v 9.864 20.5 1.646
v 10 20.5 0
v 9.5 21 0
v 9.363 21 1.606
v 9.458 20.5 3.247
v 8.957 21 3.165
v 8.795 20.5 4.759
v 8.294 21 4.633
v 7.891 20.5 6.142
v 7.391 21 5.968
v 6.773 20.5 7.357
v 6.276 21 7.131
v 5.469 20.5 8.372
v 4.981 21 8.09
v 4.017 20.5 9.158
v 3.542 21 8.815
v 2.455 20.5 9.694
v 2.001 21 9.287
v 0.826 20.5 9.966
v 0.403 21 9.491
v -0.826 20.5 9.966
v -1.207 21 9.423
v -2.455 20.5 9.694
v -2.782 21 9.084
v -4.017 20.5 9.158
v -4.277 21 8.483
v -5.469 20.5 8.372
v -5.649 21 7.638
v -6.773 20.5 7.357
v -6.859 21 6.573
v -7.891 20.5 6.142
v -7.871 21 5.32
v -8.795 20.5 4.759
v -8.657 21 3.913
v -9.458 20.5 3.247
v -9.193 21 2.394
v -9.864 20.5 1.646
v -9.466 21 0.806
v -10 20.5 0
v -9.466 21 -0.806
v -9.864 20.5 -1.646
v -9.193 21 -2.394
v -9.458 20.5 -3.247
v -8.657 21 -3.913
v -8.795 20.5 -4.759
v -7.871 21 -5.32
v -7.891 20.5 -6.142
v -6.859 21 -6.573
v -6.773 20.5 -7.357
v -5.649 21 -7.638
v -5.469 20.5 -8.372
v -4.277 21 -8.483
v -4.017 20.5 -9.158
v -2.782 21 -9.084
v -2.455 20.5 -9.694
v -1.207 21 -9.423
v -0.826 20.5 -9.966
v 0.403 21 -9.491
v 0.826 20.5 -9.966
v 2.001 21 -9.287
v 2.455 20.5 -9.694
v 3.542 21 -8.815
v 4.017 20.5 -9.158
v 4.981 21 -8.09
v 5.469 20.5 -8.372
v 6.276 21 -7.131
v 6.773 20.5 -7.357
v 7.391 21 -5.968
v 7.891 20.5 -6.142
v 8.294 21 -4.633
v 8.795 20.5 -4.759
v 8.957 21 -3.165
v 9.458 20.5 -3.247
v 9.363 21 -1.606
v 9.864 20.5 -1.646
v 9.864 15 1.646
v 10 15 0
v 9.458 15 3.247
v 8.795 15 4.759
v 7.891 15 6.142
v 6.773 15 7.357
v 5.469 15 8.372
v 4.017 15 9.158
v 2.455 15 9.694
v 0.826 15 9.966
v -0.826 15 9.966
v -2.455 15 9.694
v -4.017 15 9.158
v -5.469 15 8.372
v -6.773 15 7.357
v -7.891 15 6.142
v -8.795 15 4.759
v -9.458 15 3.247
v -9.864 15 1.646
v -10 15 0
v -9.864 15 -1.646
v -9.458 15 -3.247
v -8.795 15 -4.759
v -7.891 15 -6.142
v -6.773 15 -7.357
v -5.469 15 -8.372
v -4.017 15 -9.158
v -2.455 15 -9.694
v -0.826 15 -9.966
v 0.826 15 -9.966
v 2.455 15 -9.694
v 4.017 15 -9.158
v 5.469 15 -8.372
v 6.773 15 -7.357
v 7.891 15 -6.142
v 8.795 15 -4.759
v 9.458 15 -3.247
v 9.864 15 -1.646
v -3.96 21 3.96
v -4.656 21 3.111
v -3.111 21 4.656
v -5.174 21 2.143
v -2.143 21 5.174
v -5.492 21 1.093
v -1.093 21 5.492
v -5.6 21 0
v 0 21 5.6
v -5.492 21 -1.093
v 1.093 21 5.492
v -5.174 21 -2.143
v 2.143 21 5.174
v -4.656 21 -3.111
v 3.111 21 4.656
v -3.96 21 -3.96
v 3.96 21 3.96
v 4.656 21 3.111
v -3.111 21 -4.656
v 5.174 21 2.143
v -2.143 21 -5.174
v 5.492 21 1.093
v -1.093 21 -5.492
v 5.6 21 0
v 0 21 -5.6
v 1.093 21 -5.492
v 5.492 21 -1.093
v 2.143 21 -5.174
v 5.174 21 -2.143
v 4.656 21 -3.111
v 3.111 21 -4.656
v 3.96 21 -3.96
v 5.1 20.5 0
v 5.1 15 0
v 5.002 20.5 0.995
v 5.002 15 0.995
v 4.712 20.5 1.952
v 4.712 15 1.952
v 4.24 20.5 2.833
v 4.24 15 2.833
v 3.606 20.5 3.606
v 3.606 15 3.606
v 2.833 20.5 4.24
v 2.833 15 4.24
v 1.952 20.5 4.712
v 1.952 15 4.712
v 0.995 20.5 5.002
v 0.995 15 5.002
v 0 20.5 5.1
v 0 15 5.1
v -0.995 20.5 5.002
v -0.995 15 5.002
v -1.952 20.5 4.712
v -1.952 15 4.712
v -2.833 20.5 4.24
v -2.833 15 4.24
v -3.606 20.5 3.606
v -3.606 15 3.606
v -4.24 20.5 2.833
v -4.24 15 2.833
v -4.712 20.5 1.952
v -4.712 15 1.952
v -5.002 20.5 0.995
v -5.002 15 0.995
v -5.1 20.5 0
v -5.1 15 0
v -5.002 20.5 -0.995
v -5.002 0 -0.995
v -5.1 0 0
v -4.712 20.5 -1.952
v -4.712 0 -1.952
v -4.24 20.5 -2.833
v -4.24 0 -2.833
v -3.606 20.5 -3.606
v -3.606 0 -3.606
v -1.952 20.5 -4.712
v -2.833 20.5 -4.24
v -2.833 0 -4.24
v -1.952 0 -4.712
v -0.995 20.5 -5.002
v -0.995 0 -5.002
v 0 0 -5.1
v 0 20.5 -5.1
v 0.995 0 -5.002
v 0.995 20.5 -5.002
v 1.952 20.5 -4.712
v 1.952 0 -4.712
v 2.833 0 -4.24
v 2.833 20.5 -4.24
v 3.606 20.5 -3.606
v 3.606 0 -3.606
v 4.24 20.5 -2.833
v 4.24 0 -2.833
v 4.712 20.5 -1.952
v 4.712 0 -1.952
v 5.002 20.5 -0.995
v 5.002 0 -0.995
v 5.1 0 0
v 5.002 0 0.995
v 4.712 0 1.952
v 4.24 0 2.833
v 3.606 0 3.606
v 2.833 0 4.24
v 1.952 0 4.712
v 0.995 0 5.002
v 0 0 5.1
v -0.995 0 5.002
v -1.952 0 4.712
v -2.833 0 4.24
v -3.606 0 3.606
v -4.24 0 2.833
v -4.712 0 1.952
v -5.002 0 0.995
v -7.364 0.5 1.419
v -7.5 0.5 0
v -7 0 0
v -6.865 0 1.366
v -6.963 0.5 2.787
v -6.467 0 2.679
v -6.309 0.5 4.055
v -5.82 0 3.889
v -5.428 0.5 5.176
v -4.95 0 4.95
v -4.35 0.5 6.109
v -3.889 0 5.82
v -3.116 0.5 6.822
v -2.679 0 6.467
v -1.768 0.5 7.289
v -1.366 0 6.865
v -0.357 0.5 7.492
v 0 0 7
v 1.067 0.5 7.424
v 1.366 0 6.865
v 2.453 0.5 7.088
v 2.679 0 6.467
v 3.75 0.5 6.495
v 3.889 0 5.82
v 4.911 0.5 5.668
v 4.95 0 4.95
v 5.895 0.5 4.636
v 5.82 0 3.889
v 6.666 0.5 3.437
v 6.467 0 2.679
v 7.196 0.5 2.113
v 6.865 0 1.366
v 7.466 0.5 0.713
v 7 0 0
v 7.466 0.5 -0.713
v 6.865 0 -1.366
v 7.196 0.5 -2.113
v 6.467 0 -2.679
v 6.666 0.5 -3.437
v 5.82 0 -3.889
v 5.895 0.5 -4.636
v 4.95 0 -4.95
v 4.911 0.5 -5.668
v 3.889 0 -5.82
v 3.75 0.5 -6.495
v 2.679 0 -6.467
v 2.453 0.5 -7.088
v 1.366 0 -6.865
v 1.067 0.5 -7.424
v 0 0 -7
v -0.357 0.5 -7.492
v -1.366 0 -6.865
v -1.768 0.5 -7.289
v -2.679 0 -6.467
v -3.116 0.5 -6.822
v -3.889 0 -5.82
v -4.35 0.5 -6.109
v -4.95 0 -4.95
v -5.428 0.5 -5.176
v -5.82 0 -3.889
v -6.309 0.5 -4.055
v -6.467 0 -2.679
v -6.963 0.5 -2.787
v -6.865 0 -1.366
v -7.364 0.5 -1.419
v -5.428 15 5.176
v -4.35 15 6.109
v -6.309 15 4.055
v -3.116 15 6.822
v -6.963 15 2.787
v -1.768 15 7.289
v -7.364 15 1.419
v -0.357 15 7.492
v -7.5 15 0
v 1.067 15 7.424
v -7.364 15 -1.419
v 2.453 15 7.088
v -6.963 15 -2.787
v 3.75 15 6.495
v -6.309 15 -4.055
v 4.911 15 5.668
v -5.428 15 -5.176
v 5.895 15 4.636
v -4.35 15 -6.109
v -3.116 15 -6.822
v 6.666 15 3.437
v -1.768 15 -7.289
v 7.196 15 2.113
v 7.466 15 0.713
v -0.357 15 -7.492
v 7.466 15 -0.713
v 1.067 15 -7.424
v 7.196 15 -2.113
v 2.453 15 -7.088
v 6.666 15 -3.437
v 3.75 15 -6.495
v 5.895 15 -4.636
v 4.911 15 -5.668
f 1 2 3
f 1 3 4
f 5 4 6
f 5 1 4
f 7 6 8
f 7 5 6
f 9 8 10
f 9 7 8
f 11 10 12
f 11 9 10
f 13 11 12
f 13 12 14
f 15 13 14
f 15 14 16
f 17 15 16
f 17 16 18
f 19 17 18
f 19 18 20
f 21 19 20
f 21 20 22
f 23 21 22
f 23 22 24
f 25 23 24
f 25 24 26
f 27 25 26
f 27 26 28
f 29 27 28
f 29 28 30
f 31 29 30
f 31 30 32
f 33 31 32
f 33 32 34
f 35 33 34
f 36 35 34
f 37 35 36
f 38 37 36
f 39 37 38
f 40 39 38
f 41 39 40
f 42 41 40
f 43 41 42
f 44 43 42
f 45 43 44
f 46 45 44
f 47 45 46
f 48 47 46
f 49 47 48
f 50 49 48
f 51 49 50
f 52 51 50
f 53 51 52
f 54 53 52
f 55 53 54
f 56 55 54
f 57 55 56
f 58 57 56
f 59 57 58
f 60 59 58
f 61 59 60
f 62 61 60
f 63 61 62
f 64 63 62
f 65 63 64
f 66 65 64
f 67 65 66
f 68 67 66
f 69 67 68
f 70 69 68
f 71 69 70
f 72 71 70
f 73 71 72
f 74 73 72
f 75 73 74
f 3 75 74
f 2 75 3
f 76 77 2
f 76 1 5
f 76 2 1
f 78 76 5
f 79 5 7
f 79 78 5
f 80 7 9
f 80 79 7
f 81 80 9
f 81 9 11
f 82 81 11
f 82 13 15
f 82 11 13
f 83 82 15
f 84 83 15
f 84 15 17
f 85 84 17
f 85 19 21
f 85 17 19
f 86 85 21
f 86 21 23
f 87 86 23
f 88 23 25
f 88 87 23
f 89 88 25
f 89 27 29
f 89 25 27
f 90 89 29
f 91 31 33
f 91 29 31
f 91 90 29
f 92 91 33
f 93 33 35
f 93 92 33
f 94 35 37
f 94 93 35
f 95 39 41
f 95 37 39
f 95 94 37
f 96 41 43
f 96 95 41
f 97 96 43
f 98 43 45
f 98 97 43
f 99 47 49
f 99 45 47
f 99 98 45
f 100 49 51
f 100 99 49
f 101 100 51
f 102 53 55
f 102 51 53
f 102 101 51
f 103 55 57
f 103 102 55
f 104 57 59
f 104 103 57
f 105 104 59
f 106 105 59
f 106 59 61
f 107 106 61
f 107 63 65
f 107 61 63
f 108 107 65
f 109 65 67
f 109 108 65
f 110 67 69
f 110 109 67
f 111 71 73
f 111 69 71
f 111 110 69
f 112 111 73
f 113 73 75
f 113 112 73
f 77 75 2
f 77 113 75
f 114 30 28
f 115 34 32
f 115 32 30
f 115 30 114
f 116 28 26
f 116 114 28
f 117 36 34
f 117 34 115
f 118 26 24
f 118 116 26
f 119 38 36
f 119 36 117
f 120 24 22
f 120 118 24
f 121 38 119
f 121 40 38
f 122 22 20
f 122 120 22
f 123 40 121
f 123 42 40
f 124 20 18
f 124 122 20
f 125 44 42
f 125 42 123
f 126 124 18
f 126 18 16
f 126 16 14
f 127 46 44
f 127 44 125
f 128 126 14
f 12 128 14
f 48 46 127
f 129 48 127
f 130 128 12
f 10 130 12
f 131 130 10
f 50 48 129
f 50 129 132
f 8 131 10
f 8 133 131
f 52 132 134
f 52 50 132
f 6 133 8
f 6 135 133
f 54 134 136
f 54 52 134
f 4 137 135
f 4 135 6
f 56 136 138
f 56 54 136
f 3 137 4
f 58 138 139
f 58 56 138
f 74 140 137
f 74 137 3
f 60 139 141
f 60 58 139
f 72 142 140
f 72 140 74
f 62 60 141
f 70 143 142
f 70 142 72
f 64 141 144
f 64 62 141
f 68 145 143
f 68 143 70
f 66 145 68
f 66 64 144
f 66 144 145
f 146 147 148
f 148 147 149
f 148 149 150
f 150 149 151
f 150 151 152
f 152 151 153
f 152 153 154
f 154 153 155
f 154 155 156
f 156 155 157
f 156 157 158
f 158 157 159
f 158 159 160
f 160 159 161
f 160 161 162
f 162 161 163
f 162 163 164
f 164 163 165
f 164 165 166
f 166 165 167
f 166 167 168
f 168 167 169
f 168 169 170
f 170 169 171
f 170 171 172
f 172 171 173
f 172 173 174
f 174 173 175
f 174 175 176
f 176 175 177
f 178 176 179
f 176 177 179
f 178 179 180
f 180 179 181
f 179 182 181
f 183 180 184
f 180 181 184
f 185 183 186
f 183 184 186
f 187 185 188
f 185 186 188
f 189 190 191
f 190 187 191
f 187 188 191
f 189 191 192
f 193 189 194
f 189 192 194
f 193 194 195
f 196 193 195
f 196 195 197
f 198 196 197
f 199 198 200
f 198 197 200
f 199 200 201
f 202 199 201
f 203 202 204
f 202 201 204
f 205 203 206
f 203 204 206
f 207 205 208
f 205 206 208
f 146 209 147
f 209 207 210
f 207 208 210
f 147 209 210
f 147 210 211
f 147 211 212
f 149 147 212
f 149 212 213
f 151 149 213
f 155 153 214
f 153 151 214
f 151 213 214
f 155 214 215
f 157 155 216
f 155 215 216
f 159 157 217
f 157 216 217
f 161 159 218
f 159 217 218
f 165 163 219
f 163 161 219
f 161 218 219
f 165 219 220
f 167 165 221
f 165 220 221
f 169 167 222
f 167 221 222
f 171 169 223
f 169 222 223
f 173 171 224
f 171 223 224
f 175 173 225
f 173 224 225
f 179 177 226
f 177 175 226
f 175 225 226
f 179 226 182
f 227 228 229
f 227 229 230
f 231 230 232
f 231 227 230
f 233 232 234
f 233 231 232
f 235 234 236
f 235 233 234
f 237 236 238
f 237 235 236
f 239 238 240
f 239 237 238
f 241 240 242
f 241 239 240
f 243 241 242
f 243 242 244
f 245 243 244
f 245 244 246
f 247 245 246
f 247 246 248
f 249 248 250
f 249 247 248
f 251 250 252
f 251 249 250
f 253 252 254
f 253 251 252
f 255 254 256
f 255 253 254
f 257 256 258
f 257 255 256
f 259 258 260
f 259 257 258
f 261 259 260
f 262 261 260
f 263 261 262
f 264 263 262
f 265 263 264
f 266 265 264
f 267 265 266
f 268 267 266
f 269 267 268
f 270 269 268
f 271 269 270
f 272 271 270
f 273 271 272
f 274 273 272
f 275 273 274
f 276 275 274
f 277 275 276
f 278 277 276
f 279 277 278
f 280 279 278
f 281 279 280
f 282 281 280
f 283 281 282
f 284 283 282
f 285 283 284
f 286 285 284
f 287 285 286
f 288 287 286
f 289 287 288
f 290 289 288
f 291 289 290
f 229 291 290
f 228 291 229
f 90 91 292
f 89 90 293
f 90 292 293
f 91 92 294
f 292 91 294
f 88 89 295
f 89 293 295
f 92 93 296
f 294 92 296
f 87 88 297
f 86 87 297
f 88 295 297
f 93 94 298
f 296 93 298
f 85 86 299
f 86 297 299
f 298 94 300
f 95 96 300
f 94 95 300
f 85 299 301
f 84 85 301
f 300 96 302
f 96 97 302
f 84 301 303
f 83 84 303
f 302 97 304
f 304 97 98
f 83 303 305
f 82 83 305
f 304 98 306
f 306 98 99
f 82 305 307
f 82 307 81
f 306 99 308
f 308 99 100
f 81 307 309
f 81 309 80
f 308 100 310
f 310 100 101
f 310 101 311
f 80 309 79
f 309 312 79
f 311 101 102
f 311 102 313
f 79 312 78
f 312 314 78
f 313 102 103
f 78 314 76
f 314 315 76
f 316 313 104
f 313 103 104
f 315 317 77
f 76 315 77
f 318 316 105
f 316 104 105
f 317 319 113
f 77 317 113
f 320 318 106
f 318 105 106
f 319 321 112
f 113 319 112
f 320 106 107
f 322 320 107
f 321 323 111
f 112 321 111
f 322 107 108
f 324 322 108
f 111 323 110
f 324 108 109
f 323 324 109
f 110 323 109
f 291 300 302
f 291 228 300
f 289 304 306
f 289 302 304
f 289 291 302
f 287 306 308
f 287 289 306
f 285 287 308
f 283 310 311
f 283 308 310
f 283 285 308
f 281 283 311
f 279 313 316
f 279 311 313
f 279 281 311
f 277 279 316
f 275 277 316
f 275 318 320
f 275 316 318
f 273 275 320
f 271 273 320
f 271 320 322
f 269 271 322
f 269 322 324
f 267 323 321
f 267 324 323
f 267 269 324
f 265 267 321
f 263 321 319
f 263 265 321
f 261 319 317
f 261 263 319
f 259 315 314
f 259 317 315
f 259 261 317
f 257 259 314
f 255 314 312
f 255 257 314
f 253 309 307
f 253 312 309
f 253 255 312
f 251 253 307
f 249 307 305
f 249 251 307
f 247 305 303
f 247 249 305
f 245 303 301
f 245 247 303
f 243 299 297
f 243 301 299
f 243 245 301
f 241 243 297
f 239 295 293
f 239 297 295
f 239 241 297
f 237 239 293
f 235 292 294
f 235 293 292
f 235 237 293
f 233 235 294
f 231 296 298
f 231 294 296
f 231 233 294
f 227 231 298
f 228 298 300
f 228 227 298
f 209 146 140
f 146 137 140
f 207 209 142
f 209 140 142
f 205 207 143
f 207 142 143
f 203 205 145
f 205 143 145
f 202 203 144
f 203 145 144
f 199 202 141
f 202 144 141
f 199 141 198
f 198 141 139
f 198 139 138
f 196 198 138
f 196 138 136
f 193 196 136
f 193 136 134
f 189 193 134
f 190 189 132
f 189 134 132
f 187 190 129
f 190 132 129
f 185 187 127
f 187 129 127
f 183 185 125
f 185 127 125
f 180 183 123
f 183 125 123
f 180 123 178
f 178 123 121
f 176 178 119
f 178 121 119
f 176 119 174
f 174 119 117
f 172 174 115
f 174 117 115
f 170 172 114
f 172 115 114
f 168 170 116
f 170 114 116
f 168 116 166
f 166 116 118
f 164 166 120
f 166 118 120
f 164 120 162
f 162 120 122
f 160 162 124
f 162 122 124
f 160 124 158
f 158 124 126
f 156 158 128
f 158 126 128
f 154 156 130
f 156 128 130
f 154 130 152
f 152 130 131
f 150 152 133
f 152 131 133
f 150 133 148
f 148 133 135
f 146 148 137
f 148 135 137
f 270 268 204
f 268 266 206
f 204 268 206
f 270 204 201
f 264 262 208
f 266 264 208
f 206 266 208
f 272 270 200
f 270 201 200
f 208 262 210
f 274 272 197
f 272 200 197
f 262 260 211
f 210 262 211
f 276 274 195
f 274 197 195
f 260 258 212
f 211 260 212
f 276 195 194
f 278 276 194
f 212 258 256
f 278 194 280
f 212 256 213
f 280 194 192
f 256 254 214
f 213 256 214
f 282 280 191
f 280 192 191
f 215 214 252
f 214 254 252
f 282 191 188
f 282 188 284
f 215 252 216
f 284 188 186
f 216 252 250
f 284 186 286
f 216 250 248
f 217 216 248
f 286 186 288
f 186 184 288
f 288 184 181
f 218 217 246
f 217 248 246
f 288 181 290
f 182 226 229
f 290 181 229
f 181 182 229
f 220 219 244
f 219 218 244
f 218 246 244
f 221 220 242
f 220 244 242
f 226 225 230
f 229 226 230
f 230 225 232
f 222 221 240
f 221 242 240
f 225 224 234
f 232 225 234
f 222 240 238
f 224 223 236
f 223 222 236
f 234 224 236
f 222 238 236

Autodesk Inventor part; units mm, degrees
ref_plane "YZ Plane" through (0, 0, 0) normal (1, 0, 0) x (0, 1, 0)
ref_plane "XZ Plane" through (0, 0, 0) normal (0, 1, 0) x (-1, 0, 0)
ref_plane "XY Plane" through (0, 0, 0) normal (0, 0, 1) x (1, 0, 0)
sketch "Sketch1" plane through (0, 0, 0) normal (0, 1, 0) x (-1, 0, 0)
  circle A0 centre (0, 0) radius 7.5
  circle A1 centre (0, 0) radius 5.1
  dimension "d0" = 15
  dimension "d1" = 10.2
extrude "Extrusion1" add sketch "Sketch1" along normal blind 15
sketch "Sketch2" plane through (0, 15, 0) normal (0, 1, 0) x (1, 0, 0)
  circle A0 centre (0, 0) radius 7.5 projected
  circle A1 centre (0, 0) radius 7.5 projected
  circle A2 centre (0, 0) radius 5.1 projected
  circle A3 centre (0, 0) radius 10
  dimension "d4" = 20
extrude "Extrusion2" add sketch "Sketch2" along normal blind 6 contours A0 | A3
chamfer "Chamfer1" distance 0.5 angle 45 3 edges at (-5.1, 21, 0) (-10, 21, 0) (7.5, 0, 0)
properties part number "Bøsning_beam_bund_3DPrint"
